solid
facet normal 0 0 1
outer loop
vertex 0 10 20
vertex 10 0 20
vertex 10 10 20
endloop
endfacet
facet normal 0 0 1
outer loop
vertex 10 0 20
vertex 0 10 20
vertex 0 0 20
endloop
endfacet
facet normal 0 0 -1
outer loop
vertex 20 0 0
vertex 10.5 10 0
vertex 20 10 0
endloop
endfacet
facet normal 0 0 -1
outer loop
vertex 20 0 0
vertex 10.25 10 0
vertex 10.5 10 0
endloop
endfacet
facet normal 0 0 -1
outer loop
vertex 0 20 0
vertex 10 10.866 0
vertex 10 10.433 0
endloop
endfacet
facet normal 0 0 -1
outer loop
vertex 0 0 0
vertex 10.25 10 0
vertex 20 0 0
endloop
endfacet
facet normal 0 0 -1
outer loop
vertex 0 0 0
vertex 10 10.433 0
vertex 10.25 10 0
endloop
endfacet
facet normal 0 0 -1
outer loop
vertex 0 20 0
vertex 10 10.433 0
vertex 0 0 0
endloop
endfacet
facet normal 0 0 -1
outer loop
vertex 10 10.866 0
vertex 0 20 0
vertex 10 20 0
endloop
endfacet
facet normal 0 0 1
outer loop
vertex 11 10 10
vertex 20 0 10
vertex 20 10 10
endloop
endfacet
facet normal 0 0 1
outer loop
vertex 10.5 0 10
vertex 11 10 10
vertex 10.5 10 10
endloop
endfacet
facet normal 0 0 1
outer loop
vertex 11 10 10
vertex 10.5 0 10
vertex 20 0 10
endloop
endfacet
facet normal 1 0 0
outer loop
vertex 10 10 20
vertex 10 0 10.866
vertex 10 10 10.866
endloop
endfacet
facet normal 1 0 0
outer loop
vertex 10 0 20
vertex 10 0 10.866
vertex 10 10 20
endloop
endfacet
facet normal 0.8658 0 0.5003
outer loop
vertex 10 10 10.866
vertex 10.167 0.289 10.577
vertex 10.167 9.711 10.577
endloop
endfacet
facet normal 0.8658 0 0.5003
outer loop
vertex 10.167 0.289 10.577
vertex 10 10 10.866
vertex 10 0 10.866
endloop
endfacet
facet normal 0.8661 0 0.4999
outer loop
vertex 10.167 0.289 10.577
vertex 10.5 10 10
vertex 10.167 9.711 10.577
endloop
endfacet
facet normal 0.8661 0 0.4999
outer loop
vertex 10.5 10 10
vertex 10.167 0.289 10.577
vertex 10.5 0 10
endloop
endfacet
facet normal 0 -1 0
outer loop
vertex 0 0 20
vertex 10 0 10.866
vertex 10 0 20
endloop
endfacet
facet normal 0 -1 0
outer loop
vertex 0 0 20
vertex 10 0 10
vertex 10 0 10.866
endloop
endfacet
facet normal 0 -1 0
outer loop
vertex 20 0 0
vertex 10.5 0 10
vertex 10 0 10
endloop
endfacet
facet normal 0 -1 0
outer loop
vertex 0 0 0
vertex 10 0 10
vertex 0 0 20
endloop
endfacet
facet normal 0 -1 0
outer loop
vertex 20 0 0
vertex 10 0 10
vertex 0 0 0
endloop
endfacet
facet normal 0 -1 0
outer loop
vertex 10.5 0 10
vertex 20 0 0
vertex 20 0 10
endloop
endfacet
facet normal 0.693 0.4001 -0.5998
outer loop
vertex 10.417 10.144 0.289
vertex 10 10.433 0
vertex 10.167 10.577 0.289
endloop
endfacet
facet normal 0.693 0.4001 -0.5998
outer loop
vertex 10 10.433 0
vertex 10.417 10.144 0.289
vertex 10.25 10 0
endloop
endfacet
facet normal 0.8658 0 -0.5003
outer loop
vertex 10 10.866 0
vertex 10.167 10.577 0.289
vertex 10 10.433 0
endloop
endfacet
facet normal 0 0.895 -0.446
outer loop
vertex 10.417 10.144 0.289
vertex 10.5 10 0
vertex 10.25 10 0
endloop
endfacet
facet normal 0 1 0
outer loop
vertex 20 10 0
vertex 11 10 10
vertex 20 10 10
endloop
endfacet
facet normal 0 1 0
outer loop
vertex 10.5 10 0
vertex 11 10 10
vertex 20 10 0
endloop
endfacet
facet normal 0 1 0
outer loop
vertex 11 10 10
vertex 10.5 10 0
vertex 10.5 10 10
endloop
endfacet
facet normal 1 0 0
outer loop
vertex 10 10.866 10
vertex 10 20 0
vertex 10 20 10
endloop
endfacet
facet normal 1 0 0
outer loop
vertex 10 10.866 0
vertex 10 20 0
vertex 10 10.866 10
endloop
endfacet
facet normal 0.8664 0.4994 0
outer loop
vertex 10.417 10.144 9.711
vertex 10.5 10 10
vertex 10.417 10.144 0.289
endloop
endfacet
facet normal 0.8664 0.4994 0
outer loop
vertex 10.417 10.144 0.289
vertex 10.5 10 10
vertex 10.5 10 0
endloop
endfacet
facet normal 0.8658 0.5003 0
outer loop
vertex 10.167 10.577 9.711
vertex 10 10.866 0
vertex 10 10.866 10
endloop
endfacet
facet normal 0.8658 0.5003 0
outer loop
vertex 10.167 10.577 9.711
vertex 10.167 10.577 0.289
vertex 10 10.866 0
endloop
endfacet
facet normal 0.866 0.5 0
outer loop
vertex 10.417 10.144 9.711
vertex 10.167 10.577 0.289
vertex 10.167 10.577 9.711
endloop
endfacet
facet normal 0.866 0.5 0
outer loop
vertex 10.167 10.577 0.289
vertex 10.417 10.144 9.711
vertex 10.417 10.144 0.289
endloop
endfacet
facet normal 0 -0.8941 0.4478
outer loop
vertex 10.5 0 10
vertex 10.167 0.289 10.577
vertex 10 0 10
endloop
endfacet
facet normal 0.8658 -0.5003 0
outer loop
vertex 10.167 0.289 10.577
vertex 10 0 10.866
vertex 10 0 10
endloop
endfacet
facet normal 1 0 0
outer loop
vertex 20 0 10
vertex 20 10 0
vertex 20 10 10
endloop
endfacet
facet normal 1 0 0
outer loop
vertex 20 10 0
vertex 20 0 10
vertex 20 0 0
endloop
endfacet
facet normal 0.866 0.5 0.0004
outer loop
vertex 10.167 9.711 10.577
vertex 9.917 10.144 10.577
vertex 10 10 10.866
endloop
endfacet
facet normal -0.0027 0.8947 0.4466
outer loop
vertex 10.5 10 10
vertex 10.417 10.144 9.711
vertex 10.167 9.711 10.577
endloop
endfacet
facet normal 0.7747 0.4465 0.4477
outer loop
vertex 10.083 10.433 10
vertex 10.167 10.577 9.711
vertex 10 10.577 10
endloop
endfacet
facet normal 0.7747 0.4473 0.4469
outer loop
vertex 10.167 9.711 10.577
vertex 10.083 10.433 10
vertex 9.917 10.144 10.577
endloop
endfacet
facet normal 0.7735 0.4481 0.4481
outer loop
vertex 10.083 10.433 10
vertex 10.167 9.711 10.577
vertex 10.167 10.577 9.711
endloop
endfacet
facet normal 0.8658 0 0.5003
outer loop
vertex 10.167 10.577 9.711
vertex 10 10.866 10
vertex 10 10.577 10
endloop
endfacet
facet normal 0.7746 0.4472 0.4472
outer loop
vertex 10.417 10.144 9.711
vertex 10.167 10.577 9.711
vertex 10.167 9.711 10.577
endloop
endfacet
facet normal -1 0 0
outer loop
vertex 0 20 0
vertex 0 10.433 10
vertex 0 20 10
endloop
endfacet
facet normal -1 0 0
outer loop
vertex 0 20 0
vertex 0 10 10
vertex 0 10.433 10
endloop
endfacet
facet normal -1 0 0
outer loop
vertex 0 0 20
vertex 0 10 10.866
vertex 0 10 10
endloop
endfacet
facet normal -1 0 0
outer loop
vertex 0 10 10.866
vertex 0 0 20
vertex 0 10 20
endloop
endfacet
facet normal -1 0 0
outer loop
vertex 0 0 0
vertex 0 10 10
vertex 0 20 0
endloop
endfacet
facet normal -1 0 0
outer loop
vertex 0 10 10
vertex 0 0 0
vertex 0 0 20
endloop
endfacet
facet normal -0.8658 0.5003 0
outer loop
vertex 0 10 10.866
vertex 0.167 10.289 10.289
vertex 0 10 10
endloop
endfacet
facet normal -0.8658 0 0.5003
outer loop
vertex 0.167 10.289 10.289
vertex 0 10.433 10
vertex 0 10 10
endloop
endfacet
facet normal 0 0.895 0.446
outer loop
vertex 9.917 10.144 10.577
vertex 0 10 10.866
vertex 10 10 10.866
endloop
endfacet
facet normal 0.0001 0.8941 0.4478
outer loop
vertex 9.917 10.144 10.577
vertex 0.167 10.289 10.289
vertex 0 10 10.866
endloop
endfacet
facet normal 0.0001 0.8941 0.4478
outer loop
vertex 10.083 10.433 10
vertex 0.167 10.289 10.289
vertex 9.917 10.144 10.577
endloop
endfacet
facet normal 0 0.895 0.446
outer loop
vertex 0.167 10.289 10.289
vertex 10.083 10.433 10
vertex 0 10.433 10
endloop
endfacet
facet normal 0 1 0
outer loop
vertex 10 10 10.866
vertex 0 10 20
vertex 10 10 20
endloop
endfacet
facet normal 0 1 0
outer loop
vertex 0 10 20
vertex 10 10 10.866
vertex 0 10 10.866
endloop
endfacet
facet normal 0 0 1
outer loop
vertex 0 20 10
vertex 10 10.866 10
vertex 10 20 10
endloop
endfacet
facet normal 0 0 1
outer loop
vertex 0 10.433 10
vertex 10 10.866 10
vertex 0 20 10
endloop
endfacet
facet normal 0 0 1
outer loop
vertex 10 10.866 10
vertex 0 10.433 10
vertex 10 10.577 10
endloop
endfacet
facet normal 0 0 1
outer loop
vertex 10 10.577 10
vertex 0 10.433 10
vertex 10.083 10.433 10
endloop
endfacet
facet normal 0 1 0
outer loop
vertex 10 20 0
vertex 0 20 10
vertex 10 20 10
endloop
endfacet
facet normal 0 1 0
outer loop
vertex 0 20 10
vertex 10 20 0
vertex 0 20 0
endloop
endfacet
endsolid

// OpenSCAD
//https://www.scorchworks.com/MISC/fillets_and_rounds.scad

// by: Scorch
// http://www.scorchworks.com/Blog/openscad-modules-for-automatic-fillets-and-radii/
// www.scorchworks.com
// 12/29/2015

// PARAMETERS

sample_R    = 1;      // Radius of the fillet/round to be added

sample_OB   = 1000;   // Outer boundary (should be larger than model outer boundary)

sample_axis = "xyz";  // ["xyz":"xyz",x:x,y:y,z:z]
                      // axes to round choose one (x,y,z, or xyz)

sample_fn   = 6;      // number of facets on radius (per 360 degrees)

MAKE_EXAMPLE = 1;    // [0:Generate sample base part,1: Add fillets to base part,2: Add rounds to base part,3: Add fillets and rounds to base part,4: Add local fillets to base part,5: Add local rounds to base part,6: Add local fillets and local rounds to base part, 7: Show transparent local area selection box on base part]

//-1: Do not make example part
// 0: Generate sample base part
// 1: Add fillets to base part 
// 2: Add rounds to base part 
// 3: Add fillets and rounds to base part 
// 4: Add local fillets to base part 
// 5: Add local rounds to base part 
// 6: Add local fillets and local rounds to base part 
// 7: Show transparent local area selection box on base part 
//

//////////////////////////////////////////////////////////////////////////
//////////////////////////////////////////////////////////////////////////

// The add_fillets module will either auto fillet the whole model or
// a section of the model depending on if ther are one or two children.
// 1 child:       Fillet the whole model
// Two children:  Fillet the first child in the area that is
//                 intersected by the second child 
module add_fillets(R=1,OB=1000,axis="xyz",fn=10)
{
    fn_even = ceil(fn/2)*2;
    if ($children==1)
    {
        minkowski_fillets(R=R,OB=OB,axis=axis,fn=fn_even)
        {
            children(0);
        }
    }
    if ($children==2)
    {
        union()
        {
            minkowski_fillets(R=R,OB=OB,axis=axis,fn=fn_even)
            {
                intersection()
                {
                    children(0);
                    children(1);
                }
            }
            difference()
            {
                children(0);
                children(1);
            }
        }
    }
}


// The add_rounds module will either auto round the whole model or
// a section of the model depending on if ther are one or two children.
// 1 child:       Round the whole model
// Two children:  Round the first child in the area that is
//                  intersected by the second child 
module add_rounds(R=1,OB=1000,axis="xyz",fn=10)
{
    fn_even = ceil(fn/2)*2;
    if ($children==1)
    {
        minkowski_rounds(R=R,OB=OB,axis=axis,fn=fn_even)
        {
            children(0);
        }
    }
    if ($children==2)
    {
        union()
        {
            minkowski_rounds(R=R,OB=OB,axis=axis,fn=fn_even)
            {
                intersection()
                {
                    children(0);
                    minkowski()
                    {
                        children(1);
                        if (axis=="x")   rotate([0 ,90,0]) cylinder(r=R,$fn=fn_even,center=true);
                        if (axis=="y")   rotate([90,0 ,0]) cylinder(r=R,$fn=fn_even,center=true);
                        if (axis=="z")   rotate([0 ,0 ,0]) cylinder(r=R,$fn=fn_even,center=true);
                        if (axis=="xyz") sphere(r=R,$fn=fn_even);
                    }
                }
            }
            difference()
            {
                children(0);
                children(1);
            }
        }
    }
}




module minkowski_fillets(R=1,OB=1000,axis="xyz",fn=10)
{
    OBplus=OB+4*R;
    fn_even = ceil(fn/2)*2;
    echo(fn_even);
    difference()
    {
        cube([OB,OB,OB],center=true);
        minkowski()
        {   
            difference()
            {
                cube([OBplus,OBplus,OBplus],center=true);
                minkowski()
                {
                    children(0);
                    if (axis=="x")   rotate([0 ,90,0]) cylinder(r=R,$fn=fn_even,center=true);
                    if (axis=="y")   rotate([90,0 ,0]) cylinder(r=R,$fn=fn_even,center=true);
                    if (axis=="z")   rotate([0 ,0 ,0]) cylinder(r=R,$fn=fn_even,center=true);
                    if (axis=="xyz") sphere(r=R,$fn=fn);
                }
            }
            if (axis=="x")   rotate([0 ,90,0]) cylinder(r=R,$fn=fn_even,center=true);
            if (axis=="y")   rotate([90,0 ,0]) cylinder(r=R,$fn=fn_even,center=true);
            if (axis=="z")   rotate([0 ,0 ,0]) cylinder(r=R,$fn=fn_even,center=true);
            if (axis=="xyz") sphere(r=R,$fn=fn_even);
        }
    }
}


module minkowski_rounds(R=1,OB=1000,axis="xyz",fn=10)
{
    OBplus=OB+4*R;
    fn_even = ceil(fn/2)*2;
    minkowski()
    {  
        difference()
        {
            cube([OB,OB,OB],center=true);
            minkowski()
            {
                difference()
                {
                    cube([OBplus,OBplus,OBplus],center=true);
                    children(0);
                }
                if (axis=="x")   rotate([0 ,90,0]) cylinder(r=R,$fn=fn_even,center=true);
                if (axis=="y")   rotate([90,0 ,0]) cylinder(r=R,$fn=fn_even,center=true);
                if (axis=="z")   rotate([0 ,0 ,0]) cylinder(r=R,$fn=fn_even,center=true);
                if (axis=="xyz") sphere(r=R,$fn=fn_even);
            }
        }
        if (axis=="x")   rotate([0 ,90,0]) cylinder(r=R,$fn=fn,center=true);
        if (axis=="y")   rotate([90,0 ,0]) cylinder(r=R,$fn=fn,center=true);
        if (axis=="z")   rotate([0 ,0 ,0]) cylinder(r=R,$fn=fn,center=true);
        if (axis=="xyz") sphere(r=R,$fn=fn_even);      
    }
}

//////////////////////////////////////////////////////////
//The remainder of this file contains the Sample models //
//////////////////////////////////////////////////////////
// ------------------------------   
// Base sample object
// ------------------------------
if (MAKE_EXAMPLE==0)
    fillets_and_rounds_sample_object();

// ------------------------------   
// Sample add fillets
// ------------------------------
if (MAKE_EXAMPLE==1)
    render()
        add_fillets(R=sample_R,OB=sample_OB,axis=sample_axis,fn=sample_fn)
            fillets_and_rounds_sample_object();

// ------------------------------   
// Sample add rounds
// ------------------------------
if (MAKE_EXAMPLE==2)
    render()
        add_rounds(R=sample_R,OB=sample_OB,axis=sample_axis,fn=sample_fn)
            fillets_and_rounds_sample_object();
   
// ------------------------------   
// Sample add rounds and fillets
// ------------------------------
if (MAKE_EXAMPLE==3)
{
    render()
        add_fillets(R=sample_R,OB=sample_OB,axis=sample_axis,fn=sample_fn)
            add_rounds(R=sample_R,OB=sample_OB,axis=sample_axis,fn=sample_fn)
                fillets_and_rounds_sample_object();
}       

// ------------------------------   
// Sample add local fillets
// ------------------------------
if (MAKE_EXAMPLE==4)
{
    render()
        add_fillets(R=sample_R,OB=sample_OB,axis=sample_axis,fn=sample_fn)
        {
            fillets_and_rounds_sample_object();
            translate([10,10,0])cube([10,10,50],center=true);
        }
}

// ------------------------------   
// Sample add local rounds
// ------------------------------
if (MAKE_EXAMPLE==5)
{
    render()
        add_rounds(R=sample_R,OB=sample_OB,axis=sample_axis,fn=sample_fn)
        {
            fillets_and_rounds_sample_object();
            translate([10,10,0])cube([10,10,50],center=true);
        }
}

// ------------------------------   
// Sample add rounds and fillets
// ------------------------------
if (MAKE_EXAMPLE==6)
{
    render()
        add_fillets(R=sample_R,OB=sample_OB,axis=sample_axis,fn=sample_fn)
        {
            add_rounds(R=sample_R,OB=sample_OB,axis=sample_axis,fn=sample_fn)
            {
                fillets_and_rounds_sample_object();
                translate([10,10,0])cube([10,10,50],center=true);
            }
            translate([10,10,0])cube([10,10,50],center=true);
        }
}


// ------------------------------   
// Sample Show Intersecting Box
// ------------------------------
if (MAKE_EXAMPLE==7)
{
    fillets_and_rounds_sample_object();
    %translate([10,10,0])cube([10,10,50],center=true);

}

// -------------------
// Sample Object module
// -------------------
module fillets_and_rounds_sample_object()
{
    cube([10,20,10]);
    cube([20,10,10]);
    cube([10,10,20]);
}

// END
